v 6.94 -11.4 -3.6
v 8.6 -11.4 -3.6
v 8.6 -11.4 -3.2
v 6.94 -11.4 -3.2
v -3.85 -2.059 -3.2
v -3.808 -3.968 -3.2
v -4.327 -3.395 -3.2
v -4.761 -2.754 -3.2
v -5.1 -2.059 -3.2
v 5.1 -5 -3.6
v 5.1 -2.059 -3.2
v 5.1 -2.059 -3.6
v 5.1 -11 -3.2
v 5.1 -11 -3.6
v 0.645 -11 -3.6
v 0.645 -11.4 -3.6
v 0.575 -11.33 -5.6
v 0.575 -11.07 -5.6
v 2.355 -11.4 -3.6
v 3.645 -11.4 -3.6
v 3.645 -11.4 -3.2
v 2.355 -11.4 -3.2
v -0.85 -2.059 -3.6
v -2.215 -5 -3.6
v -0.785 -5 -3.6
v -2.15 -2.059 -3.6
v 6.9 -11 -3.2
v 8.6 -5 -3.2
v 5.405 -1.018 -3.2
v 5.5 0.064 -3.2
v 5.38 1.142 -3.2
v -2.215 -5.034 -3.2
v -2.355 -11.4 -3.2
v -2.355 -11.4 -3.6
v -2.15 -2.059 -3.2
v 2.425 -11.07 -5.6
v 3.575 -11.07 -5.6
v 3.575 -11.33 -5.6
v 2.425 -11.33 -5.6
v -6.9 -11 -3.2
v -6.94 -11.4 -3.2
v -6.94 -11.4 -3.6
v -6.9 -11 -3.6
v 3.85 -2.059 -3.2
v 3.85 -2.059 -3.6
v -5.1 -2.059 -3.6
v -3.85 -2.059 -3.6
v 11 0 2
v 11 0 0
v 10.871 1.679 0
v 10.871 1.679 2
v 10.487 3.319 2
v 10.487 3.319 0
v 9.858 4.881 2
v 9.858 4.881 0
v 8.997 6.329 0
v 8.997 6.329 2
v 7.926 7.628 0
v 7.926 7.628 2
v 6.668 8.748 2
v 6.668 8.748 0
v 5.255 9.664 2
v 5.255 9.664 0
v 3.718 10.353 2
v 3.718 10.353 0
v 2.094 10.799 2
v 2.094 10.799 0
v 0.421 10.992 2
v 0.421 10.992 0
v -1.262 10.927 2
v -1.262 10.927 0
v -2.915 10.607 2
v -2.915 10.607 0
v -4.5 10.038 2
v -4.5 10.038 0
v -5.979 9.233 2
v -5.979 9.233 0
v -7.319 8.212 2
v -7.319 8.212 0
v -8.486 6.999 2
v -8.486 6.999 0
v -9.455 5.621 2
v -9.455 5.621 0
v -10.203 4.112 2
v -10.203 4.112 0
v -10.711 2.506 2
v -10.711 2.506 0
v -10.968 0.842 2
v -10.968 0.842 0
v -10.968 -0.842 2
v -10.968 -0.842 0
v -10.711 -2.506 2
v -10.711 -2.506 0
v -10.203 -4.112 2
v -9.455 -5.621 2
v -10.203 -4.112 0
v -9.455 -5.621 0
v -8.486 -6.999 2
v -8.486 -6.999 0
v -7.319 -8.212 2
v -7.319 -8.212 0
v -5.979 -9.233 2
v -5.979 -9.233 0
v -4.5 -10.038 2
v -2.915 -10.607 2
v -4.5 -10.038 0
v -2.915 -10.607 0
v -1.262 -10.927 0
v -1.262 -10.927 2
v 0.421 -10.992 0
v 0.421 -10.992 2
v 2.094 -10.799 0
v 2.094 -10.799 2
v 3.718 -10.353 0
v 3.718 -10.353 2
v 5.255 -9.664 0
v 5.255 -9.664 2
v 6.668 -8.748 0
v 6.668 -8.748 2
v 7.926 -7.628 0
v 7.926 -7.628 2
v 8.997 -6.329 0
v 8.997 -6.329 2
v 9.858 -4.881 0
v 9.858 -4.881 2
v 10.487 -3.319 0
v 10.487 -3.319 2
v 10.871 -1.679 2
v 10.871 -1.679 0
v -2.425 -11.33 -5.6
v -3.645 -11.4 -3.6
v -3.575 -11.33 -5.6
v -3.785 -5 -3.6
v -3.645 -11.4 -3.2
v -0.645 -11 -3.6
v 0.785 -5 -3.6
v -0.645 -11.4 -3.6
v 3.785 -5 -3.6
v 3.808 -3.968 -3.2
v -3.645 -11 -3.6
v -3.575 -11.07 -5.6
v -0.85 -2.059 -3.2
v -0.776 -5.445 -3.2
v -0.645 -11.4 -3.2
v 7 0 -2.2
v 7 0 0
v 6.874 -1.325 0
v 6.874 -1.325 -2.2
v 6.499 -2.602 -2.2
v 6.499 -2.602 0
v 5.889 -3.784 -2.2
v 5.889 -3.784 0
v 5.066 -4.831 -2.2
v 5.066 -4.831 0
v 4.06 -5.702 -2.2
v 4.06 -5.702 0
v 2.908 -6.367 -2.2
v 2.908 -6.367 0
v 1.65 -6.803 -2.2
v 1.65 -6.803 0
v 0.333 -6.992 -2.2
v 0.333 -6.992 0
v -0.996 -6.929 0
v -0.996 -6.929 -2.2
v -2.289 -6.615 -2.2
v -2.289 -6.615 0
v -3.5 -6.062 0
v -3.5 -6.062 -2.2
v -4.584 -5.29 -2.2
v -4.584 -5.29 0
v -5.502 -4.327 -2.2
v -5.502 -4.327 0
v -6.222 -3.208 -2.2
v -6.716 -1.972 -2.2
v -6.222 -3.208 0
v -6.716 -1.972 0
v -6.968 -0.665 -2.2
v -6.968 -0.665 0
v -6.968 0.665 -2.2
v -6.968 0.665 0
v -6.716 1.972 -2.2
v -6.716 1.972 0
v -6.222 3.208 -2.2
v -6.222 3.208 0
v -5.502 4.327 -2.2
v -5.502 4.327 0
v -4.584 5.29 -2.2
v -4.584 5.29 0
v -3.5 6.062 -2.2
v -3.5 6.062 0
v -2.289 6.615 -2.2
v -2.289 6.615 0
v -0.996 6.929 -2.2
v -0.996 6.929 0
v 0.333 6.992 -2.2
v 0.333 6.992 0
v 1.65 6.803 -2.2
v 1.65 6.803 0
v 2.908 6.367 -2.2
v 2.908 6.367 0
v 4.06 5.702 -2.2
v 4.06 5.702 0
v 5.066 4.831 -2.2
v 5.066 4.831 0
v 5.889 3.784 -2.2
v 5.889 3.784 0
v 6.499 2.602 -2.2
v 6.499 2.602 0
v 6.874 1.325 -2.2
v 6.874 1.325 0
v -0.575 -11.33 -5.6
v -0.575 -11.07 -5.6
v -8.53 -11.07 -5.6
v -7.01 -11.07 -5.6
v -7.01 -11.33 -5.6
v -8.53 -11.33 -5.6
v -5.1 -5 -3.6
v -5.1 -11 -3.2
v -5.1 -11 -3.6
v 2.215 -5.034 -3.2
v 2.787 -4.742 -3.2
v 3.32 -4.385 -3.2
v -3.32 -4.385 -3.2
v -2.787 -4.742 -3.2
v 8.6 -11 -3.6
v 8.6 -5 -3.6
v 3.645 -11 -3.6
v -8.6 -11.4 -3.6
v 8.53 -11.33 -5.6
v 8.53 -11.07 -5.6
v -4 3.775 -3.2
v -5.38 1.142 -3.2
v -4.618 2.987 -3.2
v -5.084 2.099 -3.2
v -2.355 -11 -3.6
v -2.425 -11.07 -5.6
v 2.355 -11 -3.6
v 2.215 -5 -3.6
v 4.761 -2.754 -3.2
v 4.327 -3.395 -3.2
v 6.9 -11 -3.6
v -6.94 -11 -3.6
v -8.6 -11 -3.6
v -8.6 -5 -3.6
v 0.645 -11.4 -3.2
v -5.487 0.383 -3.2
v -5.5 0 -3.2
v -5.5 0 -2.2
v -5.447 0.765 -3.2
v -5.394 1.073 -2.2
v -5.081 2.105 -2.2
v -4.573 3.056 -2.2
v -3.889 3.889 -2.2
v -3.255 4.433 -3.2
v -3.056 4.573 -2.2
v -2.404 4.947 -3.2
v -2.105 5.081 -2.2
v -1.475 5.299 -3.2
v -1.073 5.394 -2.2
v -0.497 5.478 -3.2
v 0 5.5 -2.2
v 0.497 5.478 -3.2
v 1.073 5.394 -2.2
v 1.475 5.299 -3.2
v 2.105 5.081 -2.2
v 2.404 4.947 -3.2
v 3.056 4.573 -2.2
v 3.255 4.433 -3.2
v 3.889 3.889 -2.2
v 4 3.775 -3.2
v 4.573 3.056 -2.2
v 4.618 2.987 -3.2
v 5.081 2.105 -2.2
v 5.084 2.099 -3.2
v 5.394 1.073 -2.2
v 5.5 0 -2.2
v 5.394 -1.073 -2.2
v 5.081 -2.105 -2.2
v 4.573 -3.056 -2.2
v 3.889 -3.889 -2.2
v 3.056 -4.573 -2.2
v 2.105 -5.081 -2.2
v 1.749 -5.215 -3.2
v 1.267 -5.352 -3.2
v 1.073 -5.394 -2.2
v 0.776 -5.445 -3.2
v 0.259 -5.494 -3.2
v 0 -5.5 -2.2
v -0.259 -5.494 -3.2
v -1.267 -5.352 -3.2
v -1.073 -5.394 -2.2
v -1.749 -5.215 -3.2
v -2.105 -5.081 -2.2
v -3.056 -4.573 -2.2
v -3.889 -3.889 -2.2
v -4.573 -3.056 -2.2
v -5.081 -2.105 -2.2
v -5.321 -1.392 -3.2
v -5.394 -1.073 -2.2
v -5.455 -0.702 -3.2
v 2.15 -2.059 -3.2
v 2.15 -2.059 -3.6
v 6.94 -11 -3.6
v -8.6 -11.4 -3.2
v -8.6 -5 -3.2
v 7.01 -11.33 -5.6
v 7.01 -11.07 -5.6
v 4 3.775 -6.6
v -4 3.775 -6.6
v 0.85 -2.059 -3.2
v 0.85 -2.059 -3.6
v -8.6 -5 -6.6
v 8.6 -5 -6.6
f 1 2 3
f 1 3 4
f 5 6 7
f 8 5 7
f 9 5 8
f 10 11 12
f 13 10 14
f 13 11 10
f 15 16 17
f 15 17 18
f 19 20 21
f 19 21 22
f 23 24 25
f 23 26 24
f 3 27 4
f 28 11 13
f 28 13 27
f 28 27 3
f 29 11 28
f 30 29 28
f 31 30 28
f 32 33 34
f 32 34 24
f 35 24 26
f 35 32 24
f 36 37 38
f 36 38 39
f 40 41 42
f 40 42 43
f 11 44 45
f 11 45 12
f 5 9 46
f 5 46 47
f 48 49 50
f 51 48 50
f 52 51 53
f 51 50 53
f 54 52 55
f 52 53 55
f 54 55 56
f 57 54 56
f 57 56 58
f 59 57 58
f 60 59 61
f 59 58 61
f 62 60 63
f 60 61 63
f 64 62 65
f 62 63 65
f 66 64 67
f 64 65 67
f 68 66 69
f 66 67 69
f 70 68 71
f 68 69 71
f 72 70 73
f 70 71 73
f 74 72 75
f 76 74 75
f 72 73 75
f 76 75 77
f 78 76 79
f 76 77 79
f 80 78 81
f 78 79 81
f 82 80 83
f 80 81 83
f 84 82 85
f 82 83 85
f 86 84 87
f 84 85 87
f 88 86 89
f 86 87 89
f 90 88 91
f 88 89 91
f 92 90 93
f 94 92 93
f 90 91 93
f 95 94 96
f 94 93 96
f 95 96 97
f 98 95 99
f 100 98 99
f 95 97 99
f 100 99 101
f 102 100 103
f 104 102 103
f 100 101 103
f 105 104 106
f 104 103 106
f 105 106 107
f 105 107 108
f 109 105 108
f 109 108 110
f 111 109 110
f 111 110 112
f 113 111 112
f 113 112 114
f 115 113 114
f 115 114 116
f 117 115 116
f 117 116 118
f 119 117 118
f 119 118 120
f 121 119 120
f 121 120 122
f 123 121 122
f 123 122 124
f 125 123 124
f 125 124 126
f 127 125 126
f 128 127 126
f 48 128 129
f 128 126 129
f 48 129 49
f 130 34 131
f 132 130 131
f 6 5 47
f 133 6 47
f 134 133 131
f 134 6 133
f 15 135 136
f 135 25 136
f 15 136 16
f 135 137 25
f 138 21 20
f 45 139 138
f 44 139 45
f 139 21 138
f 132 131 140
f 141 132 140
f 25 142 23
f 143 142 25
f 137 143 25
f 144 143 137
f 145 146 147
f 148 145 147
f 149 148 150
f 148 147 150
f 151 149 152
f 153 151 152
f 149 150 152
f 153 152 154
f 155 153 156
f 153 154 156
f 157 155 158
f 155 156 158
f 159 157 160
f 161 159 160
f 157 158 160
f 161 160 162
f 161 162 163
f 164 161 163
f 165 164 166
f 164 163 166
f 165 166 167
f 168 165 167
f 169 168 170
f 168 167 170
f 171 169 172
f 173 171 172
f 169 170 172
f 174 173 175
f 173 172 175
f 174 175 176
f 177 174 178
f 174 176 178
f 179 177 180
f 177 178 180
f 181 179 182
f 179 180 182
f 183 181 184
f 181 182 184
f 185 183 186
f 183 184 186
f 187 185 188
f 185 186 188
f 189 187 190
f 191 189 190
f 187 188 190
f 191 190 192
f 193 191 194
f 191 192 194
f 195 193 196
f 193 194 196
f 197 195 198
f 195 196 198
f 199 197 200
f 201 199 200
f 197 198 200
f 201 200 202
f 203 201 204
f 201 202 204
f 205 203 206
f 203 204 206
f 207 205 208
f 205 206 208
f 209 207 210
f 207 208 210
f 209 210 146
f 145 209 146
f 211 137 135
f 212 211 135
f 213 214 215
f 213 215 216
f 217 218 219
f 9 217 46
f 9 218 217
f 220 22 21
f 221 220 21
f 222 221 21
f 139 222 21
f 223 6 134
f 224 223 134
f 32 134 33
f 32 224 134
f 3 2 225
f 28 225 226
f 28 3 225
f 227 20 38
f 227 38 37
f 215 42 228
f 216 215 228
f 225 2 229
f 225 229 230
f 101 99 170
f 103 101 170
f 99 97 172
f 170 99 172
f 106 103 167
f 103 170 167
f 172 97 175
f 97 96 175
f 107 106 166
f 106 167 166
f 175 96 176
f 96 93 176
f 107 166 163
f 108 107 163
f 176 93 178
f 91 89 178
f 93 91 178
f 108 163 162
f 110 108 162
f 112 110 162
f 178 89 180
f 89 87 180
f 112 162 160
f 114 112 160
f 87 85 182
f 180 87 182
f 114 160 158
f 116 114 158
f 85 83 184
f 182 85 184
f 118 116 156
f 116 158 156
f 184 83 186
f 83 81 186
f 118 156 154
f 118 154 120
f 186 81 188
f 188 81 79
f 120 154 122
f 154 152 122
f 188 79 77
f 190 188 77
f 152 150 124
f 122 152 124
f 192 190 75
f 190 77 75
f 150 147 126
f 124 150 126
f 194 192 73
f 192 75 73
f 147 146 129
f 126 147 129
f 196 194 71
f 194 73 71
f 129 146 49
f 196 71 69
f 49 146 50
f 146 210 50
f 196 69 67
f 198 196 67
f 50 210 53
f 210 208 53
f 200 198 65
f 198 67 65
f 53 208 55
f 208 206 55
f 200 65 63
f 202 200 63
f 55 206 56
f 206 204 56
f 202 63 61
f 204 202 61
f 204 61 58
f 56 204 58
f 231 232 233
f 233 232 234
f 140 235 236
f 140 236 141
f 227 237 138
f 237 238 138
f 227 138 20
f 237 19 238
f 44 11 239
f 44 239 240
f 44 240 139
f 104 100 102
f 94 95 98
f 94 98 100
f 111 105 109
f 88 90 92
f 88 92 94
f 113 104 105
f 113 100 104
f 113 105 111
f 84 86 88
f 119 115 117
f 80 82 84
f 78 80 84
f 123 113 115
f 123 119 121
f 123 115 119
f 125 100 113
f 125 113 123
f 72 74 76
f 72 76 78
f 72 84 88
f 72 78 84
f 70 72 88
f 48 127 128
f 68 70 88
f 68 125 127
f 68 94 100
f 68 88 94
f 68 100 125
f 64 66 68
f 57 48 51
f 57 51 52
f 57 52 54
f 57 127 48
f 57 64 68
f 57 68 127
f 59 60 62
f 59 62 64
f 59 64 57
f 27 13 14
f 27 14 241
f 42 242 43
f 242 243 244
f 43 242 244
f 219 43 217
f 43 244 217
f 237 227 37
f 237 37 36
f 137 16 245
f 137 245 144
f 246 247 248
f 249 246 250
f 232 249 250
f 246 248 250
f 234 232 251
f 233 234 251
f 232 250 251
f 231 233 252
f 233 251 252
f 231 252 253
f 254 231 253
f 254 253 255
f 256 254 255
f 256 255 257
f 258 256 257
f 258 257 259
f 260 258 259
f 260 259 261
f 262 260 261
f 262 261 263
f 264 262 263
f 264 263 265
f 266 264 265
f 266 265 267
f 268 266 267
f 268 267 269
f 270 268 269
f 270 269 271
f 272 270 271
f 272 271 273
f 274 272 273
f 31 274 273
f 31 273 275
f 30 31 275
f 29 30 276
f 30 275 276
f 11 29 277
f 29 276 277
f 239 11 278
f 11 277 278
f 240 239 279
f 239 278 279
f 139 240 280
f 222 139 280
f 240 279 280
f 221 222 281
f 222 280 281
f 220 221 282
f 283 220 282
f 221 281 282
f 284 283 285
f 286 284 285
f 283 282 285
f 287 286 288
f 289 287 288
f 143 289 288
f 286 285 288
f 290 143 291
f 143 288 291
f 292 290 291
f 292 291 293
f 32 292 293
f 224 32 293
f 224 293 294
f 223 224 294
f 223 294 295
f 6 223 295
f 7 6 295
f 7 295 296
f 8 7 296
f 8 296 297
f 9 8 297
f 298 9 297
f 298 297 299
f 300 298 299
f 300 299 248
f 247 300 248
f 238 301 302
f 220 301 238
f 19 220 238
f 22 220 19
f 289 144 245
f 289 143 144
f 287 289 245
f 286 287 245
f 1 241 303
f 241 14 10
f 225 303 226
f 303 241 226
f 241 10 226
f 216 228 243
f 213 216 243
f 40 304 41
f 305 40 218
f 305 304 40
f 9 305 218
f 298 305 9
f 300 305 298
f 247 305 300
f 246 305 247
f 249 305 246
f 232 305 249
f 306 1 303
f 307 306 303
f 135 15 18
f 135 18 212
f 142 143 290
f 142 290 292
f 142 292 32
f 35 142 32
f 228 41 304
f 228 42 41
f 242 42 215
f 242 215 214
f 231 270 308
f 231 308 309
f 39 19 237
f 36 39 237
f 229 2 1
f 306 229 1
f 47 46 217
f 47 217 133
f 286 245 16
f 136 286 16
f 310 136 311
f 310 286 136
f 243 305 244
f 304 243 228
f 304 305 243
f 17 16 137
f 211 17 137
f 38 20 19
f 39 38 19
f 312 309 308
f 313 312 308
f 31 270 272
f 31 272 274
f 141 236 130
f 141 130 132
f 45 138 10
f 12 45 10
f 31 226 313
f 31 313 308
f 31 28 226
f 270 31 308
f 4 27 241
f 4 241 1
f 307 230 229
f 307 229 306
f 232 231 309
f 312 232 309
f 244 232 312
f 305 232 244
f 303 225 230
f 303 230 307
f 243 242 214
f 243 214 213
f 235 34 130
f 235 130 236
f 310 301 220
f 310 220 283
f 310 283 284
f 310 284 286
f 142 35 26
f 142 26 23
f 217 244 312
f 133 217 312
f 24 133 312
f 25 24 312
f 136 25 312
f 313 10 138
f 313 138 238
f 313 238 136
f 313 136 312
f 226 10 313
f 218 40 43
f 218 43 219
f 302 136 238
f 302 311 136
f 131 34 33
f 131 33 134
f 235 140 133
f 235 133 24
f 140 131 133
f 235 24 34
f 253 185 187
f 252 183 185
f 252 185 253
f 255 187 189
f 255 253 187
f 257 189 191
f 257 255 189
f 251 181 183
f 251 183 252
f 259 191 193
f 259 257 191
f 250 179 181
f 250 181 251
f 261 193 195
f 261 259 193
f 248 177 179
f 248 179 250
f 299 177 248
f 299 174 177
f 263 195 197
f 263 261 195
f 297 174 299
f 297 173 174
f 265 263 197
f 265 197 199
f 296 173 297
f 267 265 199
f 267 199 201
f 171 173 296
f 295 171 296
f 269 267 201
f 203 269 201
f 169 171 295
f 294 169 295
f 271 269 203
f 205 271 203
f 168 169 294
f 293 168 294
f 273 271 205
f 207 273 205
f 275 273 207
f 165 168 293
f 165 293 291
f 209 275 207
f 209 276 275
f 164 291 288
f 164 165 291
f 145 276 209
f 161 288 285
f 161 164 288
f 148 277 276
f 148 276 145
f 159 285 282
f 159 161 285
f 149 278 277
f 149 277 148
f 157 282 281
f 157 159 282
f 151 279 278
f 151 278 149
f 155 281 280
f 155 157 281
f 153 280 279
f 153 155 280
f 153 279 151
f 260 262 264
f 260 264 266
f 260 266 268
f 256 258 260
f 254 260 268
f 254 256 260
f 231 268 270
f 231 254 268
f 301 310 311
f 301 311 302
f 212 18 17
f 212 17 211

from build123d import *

# Parameters (mm, degrees)
SKETCH1_R                     = 11
BOSS_EXTRUDE1_DEPTH           = 2
SKETCH2_R                     = 7
BOSS_EXTRUDE2_DEPTH           = 2.2
SKETCH3_R                     = 5.5
BOSS_EXTRUDE3_DEPTH           = 1
BOSS_EXTRUDE4_DEPTH           = 0.4
BOSS_EXTRUDE5_DEPTH           = 3
SKETCH6_W                     = 1.66
SKETCH6_H                     = 0.4
BOSS_EXTRUDE6_DEPTH           = 2
BOSS_EXTRUDE6_DRAFT           = 2
SKETCH6_W_2                   = 1.289820998
BOSS_EXTRUDE6_PROFILE_2_DEPTH = 2
BOSS_EXTRUDE6_PROFILE_2_DRAFT = 2
BOSS_EXTRUDE6_PROFILE_3_DEPTH = 2
BOSS_EXTRUDE6_PROFILE_3_DRAFT = 2
BOSS_EXTRUDE6_PROFILE_4_DEPTH = 2
BOSS_EXTRUDE6_PROFILE_4_DRAFT = 2
BOSS_EXTRUDE6_PROFILE_5_DEPTH = 2
BOSS_EXTRUDE6_PROFILE_5_DRAFT = 2
SKETCH7_W                     = 17.2
SKETCH7_H                     = 6.6
CUT_EXTRUDE1_DEPTH            = 2


with BuildPart() as part:
    # Sketch1 → Boss-Extrude1 (new body)
    with BuildSketch(Plane.XY):
        Circle(SKETCH1_R)
    extrude(amount=BOSS_EXTRUDE1_DEPTH)

    # Sketch2 → Boss-Extrude2 (add)
    with BuildSketch(Plane(origin=(0, 0, 0), x_dir=(-1, 0, 0), z_dir=(0, 0, -1))):
        with Locations(Location((0, 0, 0), (0, 0, 180))):
            Circle(SKETCH2_R)
    extrude(amount=BOSS_EXTRUDE2_DEPTH)

    # Sketch3 → Boss-Extrude3 (add)
    with BuildSketch(Plane(origin=(0, 0, -2.2), x_dir=(-1, 0, 0), z_dir=(0, 0, -1))):
        Circle(SKETCH3_R)
    extrude(amount=BOSS_EXTRUDE3_DEPTH)

    # Sketch4 → Boss-Extrude4 (add)
    with BuildSketch(Plane(origin=(0, 0, -3.2), x_dir=(-1, 0, 0), z_dir=(0, 0, -1))):
        Polygon((-4, 3.774917218), (4, 3.774917218), (8.6, -5), (8.6, -18), (7.6, -18), (6.9, -11), (5.1, -11), (5.1, -2.059126028), (3.85, -2.059126028), (3.5, -18), (2.5, -18), (2.15, -2.059126028), (0.85, -2.059126028), (0.5, -18), (-0.5, -18), (-0.85, -2.059126028), (-2.15, -2.059126028), (-2.5, -18), (-3.5, -18), (-3.85, -2.059126028), (-5.1, -2.059126028), (-5.1, -11), (-6.9, -11), (-7.6, -18), (-8.6, -18), (-8.6, -5), align=None)
    extrude(amount=BOSS_EXTRUDE4_DEPTH)

    # Sketch5 → Boss-Extrude5 (add)
    with BuildSketch(Plane(origin=(0, 0, -3.6), x_dir=(-1, 0, 0), z_dir=(0, 0, -1))):
        Polygon((-8.6, -5), (-4, 3.774917218), (4, 3.774917218), (8.6, -5), align=None)
    extrude(amount=BOSS_EXTRUDE5_DEPTH)


with BuildPart() as boss_extrude6_tool:
    # Sketch6 → Boss-Extrude6 (with draft: the straight prism first)
    with BuildSketch(Plane(origin=(0, 0, -3.6), x_dir=(-1, 0, 0), z_dir=(0, 0, -1))):
        with Locations((7.77, -11.2)):
            Rectangle(SKETCH6_W, SKETCH6_H)
    extrude(amount=BOSS_EXTRUDE6_DEPTH)
    # Boss-Extrude6: the draft: its side faces are tilted about the plane it starts from
    boss_extrude6_sides = [boss_extrude6_tool.faces().sort_by_distance(p)[0] for p in [
        (-8.6, -11.2, -4.6),
        (-7.77, -11, -4.6),
        (-6.94, -11.2, -4.6),
        (-7.77, -11.4, -4.6),
    ]]
    draft(boss_extrude6_sides, Plane(origin=(0, 0, -3.6), x_dir=(-1, 0, 0), z_dir=(0, 0, -1)), BOSS_EXTRUDE6_DRAFT)


with BuildPart() as part_1:
    add(part.part)

    # Boss-Extrude6: add boss_extrude6_tool
    add(boss_extrude6_tool.part)


with BuildPart() as boss_extrude6_profile_2_tool:
    # Sketch6 → Boss-Extrude6 profile 2 (with draft: the straight prism first)
    with BuildSketch(Plane(origin=(0, 0, -3.6), x_dir=(-1, 0, 0), z_dir=(0, 0, -1))):
        with Locations((3, -11.2)):
            Rectangle(SKETCH6_W_2, SKETCH6_H)
    extrude(amount=BOSS_EXTRUDE6_PROFILE_2_DEPTH)
    # Boss-Extrude6 profile 2: the draft: its side faces are tilted about the plane it starts from
    boss_extrude6_profile_2_sides = [boss_extrude6_profile_2_tool.faces().sort_by_distance(p)[0] for p in [
        (-2.355089501, -11.2, -4.6),
        (-3, -11.4, -4.6),
        (-3.644910499, -11.2, -4.6),
        (-3, -11, -4.6),
    ]]
    draft(boss_extrude6_profile_2_sides, Plane(origin=(0, 0, -3.6), x_dir=(-1, 0, 0), z_dir=(0, 0, -1)), BOSS_EXTRUDE6_PROFILE_2_DRAFT)


with BuildPart() as part_2:
    add(part_1.part)

    # Boss-Extrude6 profile 2: add boss_extrude6_profile_2_tool
    add(boss_extrude6_profile_2_tool.part)


with BuildPart() as boss_extrude6_profile_3_tool:
    # Sketch6 → Boss-Extrude6 profile 3 (with draft: the straight prism first)
    with BuildSketch(Plane(origin=(0, 0, -3.6), x_dir=(-1, 0, 0), z_dir=(0, 0, -1))):
        with Locations((0, -11.2)):
            Rectangle(SKETCH6_W_2, SKETCH6_H)
    extrude(amount=BOSS_EXTRUDE6_PROFILE_3_DEPTH)
    # Boss-Extrude6 profile 3: the draft: its side faces are tilted about the plane it starts from
    boss_extrude6_profile_3_sides = [boss_extrude6_profile_3_tool.faces().sort_by_distance(p)[0] for p in [
        (0.644910499, -11.2, -4.6),
        (0, -11.4, -4.6),
        (-0.644910499, -11.2, -4.6),
        (0, -11, -4.6),
    ]]
    draft(boss_extrude6_profile_3_sides, Plane(origin=(0, 0, -3.6), x_dir=(-1, 0, 0), z_dir=(0, 0, -1)), BOSS_EXTRUDE6_PROFILE_3_DRAFT)


with BuildPart() as part_3:
    add(part_2.part)

    # Boss-Extrude6 profile 3: add boss_extrude6_profile_3_tool
    add(boss_extrude6_profile_3_tool.part)


with BuildPart() as boss_extrude6_profile_4_tool:
    # Sketch6 → Boss-Extrude6 profile 4 (with draft: the straight prism first)
    with BuildSketch(Plane(origin=(0, 0, -3.6), x_dir=(-1, 0, 0), z_dir=(0, 0, -1))):
        with Locations((-3, -11.2)):
            Rectangle(SKETCH6_W_2, SKETCH6_H)
    extrude(amount=BOSS_EXTRUDE6_PROFILE_4_DEPTH)
    # Boss-Extrude6 profile 4: the draft: its side faces are tilted about the plane it starts from
    boss_extrude6_profile_4_sides = [boss_extrude6_profile_4_tool.faces().sort_by_distance(p)[0] for p in [
        (3.644910499, -11.2, -4.6),
        (3, -11.4, -4.6),
        (2.355089501, -11.2, -4.6),
        (3, -11, -4.6),
    ]]
    draft(boss_extrude6_profile_4_sides, Plane(origin=(0, 0, -3.6), x_dir=(-1, 0, 0), z_dir=(0, 0, -1)), BOSS_EXTRUDE6_PROFILE_4_DRAFT)


with BuildPart() as part_4:
    add(part_3.part)

    # Boss-Extrude6 profile 4: add boss_extrude6_profile_4_tool
    add(boss_extrude6_profile_4_tool.part)


with BuildPart() as boss_extrude6_profile_5_tool:
    # Sketch6 → Boss-Extrude6 profile 5 (with draft: the straight prism first)
    with BuildSketch(Plane(origin=(0, 0, -3.6), x_dir=(-1, 0, 0), z_dir=(0, 0, -1))):
        with Locations((-7.77, -11.2)):
            Rectangle(SKETCH6_W, SKETCH6_H)
    extrude(amount=BOSS_EXTRUDE6_PROFILE_5_DEPTH)
    # Boss-Extrude6 profile 5: the draft: its side faces are tilted about the plane it starts from
    boss_extrude6_profile_5_sides = [boss_extrude6_profile_5_tool.faces().sort_by_distance(p)[0] for p in [
        (6.94, -11.2, -4.6),
        (7.77, -11, -4.6),
        (8.6, -11.2, -4.6),
        (7.77, -11.4, -4.6),
    ]]
    draft(boss_extrude6_profile_5_sides, Plane(origin=(0, 0, -3.6), x_dir=(-1, 0, 0), z_dir=(0, 0, -1)), BOSS_EXTRUDE6_PROFILE_5_DRAFT)


with BuildPart() as part_5:
    add(part_4.part)

    # Boss-Extrude6 profile 5: add boss_extrude6_profile_5_tool
    add(boss_extrude6_profile_5_tool.part)

    # Sketch7 → Cut-Extrude1 (cut)
    with BuildSketch(Plane(origin=(0, 0, -3.6), x_dir=(-1, 0, 0), z_dir=(0, 0, -1))):
        with Locations((0, -14.7)):
            Rectangle(SKETCH7_W, SKETCH7_H)
    extrude(amount=-CUT_EXTRUDE1_DEPTH, mode=Mode.SUBTRACT)


solid = part_5.part
